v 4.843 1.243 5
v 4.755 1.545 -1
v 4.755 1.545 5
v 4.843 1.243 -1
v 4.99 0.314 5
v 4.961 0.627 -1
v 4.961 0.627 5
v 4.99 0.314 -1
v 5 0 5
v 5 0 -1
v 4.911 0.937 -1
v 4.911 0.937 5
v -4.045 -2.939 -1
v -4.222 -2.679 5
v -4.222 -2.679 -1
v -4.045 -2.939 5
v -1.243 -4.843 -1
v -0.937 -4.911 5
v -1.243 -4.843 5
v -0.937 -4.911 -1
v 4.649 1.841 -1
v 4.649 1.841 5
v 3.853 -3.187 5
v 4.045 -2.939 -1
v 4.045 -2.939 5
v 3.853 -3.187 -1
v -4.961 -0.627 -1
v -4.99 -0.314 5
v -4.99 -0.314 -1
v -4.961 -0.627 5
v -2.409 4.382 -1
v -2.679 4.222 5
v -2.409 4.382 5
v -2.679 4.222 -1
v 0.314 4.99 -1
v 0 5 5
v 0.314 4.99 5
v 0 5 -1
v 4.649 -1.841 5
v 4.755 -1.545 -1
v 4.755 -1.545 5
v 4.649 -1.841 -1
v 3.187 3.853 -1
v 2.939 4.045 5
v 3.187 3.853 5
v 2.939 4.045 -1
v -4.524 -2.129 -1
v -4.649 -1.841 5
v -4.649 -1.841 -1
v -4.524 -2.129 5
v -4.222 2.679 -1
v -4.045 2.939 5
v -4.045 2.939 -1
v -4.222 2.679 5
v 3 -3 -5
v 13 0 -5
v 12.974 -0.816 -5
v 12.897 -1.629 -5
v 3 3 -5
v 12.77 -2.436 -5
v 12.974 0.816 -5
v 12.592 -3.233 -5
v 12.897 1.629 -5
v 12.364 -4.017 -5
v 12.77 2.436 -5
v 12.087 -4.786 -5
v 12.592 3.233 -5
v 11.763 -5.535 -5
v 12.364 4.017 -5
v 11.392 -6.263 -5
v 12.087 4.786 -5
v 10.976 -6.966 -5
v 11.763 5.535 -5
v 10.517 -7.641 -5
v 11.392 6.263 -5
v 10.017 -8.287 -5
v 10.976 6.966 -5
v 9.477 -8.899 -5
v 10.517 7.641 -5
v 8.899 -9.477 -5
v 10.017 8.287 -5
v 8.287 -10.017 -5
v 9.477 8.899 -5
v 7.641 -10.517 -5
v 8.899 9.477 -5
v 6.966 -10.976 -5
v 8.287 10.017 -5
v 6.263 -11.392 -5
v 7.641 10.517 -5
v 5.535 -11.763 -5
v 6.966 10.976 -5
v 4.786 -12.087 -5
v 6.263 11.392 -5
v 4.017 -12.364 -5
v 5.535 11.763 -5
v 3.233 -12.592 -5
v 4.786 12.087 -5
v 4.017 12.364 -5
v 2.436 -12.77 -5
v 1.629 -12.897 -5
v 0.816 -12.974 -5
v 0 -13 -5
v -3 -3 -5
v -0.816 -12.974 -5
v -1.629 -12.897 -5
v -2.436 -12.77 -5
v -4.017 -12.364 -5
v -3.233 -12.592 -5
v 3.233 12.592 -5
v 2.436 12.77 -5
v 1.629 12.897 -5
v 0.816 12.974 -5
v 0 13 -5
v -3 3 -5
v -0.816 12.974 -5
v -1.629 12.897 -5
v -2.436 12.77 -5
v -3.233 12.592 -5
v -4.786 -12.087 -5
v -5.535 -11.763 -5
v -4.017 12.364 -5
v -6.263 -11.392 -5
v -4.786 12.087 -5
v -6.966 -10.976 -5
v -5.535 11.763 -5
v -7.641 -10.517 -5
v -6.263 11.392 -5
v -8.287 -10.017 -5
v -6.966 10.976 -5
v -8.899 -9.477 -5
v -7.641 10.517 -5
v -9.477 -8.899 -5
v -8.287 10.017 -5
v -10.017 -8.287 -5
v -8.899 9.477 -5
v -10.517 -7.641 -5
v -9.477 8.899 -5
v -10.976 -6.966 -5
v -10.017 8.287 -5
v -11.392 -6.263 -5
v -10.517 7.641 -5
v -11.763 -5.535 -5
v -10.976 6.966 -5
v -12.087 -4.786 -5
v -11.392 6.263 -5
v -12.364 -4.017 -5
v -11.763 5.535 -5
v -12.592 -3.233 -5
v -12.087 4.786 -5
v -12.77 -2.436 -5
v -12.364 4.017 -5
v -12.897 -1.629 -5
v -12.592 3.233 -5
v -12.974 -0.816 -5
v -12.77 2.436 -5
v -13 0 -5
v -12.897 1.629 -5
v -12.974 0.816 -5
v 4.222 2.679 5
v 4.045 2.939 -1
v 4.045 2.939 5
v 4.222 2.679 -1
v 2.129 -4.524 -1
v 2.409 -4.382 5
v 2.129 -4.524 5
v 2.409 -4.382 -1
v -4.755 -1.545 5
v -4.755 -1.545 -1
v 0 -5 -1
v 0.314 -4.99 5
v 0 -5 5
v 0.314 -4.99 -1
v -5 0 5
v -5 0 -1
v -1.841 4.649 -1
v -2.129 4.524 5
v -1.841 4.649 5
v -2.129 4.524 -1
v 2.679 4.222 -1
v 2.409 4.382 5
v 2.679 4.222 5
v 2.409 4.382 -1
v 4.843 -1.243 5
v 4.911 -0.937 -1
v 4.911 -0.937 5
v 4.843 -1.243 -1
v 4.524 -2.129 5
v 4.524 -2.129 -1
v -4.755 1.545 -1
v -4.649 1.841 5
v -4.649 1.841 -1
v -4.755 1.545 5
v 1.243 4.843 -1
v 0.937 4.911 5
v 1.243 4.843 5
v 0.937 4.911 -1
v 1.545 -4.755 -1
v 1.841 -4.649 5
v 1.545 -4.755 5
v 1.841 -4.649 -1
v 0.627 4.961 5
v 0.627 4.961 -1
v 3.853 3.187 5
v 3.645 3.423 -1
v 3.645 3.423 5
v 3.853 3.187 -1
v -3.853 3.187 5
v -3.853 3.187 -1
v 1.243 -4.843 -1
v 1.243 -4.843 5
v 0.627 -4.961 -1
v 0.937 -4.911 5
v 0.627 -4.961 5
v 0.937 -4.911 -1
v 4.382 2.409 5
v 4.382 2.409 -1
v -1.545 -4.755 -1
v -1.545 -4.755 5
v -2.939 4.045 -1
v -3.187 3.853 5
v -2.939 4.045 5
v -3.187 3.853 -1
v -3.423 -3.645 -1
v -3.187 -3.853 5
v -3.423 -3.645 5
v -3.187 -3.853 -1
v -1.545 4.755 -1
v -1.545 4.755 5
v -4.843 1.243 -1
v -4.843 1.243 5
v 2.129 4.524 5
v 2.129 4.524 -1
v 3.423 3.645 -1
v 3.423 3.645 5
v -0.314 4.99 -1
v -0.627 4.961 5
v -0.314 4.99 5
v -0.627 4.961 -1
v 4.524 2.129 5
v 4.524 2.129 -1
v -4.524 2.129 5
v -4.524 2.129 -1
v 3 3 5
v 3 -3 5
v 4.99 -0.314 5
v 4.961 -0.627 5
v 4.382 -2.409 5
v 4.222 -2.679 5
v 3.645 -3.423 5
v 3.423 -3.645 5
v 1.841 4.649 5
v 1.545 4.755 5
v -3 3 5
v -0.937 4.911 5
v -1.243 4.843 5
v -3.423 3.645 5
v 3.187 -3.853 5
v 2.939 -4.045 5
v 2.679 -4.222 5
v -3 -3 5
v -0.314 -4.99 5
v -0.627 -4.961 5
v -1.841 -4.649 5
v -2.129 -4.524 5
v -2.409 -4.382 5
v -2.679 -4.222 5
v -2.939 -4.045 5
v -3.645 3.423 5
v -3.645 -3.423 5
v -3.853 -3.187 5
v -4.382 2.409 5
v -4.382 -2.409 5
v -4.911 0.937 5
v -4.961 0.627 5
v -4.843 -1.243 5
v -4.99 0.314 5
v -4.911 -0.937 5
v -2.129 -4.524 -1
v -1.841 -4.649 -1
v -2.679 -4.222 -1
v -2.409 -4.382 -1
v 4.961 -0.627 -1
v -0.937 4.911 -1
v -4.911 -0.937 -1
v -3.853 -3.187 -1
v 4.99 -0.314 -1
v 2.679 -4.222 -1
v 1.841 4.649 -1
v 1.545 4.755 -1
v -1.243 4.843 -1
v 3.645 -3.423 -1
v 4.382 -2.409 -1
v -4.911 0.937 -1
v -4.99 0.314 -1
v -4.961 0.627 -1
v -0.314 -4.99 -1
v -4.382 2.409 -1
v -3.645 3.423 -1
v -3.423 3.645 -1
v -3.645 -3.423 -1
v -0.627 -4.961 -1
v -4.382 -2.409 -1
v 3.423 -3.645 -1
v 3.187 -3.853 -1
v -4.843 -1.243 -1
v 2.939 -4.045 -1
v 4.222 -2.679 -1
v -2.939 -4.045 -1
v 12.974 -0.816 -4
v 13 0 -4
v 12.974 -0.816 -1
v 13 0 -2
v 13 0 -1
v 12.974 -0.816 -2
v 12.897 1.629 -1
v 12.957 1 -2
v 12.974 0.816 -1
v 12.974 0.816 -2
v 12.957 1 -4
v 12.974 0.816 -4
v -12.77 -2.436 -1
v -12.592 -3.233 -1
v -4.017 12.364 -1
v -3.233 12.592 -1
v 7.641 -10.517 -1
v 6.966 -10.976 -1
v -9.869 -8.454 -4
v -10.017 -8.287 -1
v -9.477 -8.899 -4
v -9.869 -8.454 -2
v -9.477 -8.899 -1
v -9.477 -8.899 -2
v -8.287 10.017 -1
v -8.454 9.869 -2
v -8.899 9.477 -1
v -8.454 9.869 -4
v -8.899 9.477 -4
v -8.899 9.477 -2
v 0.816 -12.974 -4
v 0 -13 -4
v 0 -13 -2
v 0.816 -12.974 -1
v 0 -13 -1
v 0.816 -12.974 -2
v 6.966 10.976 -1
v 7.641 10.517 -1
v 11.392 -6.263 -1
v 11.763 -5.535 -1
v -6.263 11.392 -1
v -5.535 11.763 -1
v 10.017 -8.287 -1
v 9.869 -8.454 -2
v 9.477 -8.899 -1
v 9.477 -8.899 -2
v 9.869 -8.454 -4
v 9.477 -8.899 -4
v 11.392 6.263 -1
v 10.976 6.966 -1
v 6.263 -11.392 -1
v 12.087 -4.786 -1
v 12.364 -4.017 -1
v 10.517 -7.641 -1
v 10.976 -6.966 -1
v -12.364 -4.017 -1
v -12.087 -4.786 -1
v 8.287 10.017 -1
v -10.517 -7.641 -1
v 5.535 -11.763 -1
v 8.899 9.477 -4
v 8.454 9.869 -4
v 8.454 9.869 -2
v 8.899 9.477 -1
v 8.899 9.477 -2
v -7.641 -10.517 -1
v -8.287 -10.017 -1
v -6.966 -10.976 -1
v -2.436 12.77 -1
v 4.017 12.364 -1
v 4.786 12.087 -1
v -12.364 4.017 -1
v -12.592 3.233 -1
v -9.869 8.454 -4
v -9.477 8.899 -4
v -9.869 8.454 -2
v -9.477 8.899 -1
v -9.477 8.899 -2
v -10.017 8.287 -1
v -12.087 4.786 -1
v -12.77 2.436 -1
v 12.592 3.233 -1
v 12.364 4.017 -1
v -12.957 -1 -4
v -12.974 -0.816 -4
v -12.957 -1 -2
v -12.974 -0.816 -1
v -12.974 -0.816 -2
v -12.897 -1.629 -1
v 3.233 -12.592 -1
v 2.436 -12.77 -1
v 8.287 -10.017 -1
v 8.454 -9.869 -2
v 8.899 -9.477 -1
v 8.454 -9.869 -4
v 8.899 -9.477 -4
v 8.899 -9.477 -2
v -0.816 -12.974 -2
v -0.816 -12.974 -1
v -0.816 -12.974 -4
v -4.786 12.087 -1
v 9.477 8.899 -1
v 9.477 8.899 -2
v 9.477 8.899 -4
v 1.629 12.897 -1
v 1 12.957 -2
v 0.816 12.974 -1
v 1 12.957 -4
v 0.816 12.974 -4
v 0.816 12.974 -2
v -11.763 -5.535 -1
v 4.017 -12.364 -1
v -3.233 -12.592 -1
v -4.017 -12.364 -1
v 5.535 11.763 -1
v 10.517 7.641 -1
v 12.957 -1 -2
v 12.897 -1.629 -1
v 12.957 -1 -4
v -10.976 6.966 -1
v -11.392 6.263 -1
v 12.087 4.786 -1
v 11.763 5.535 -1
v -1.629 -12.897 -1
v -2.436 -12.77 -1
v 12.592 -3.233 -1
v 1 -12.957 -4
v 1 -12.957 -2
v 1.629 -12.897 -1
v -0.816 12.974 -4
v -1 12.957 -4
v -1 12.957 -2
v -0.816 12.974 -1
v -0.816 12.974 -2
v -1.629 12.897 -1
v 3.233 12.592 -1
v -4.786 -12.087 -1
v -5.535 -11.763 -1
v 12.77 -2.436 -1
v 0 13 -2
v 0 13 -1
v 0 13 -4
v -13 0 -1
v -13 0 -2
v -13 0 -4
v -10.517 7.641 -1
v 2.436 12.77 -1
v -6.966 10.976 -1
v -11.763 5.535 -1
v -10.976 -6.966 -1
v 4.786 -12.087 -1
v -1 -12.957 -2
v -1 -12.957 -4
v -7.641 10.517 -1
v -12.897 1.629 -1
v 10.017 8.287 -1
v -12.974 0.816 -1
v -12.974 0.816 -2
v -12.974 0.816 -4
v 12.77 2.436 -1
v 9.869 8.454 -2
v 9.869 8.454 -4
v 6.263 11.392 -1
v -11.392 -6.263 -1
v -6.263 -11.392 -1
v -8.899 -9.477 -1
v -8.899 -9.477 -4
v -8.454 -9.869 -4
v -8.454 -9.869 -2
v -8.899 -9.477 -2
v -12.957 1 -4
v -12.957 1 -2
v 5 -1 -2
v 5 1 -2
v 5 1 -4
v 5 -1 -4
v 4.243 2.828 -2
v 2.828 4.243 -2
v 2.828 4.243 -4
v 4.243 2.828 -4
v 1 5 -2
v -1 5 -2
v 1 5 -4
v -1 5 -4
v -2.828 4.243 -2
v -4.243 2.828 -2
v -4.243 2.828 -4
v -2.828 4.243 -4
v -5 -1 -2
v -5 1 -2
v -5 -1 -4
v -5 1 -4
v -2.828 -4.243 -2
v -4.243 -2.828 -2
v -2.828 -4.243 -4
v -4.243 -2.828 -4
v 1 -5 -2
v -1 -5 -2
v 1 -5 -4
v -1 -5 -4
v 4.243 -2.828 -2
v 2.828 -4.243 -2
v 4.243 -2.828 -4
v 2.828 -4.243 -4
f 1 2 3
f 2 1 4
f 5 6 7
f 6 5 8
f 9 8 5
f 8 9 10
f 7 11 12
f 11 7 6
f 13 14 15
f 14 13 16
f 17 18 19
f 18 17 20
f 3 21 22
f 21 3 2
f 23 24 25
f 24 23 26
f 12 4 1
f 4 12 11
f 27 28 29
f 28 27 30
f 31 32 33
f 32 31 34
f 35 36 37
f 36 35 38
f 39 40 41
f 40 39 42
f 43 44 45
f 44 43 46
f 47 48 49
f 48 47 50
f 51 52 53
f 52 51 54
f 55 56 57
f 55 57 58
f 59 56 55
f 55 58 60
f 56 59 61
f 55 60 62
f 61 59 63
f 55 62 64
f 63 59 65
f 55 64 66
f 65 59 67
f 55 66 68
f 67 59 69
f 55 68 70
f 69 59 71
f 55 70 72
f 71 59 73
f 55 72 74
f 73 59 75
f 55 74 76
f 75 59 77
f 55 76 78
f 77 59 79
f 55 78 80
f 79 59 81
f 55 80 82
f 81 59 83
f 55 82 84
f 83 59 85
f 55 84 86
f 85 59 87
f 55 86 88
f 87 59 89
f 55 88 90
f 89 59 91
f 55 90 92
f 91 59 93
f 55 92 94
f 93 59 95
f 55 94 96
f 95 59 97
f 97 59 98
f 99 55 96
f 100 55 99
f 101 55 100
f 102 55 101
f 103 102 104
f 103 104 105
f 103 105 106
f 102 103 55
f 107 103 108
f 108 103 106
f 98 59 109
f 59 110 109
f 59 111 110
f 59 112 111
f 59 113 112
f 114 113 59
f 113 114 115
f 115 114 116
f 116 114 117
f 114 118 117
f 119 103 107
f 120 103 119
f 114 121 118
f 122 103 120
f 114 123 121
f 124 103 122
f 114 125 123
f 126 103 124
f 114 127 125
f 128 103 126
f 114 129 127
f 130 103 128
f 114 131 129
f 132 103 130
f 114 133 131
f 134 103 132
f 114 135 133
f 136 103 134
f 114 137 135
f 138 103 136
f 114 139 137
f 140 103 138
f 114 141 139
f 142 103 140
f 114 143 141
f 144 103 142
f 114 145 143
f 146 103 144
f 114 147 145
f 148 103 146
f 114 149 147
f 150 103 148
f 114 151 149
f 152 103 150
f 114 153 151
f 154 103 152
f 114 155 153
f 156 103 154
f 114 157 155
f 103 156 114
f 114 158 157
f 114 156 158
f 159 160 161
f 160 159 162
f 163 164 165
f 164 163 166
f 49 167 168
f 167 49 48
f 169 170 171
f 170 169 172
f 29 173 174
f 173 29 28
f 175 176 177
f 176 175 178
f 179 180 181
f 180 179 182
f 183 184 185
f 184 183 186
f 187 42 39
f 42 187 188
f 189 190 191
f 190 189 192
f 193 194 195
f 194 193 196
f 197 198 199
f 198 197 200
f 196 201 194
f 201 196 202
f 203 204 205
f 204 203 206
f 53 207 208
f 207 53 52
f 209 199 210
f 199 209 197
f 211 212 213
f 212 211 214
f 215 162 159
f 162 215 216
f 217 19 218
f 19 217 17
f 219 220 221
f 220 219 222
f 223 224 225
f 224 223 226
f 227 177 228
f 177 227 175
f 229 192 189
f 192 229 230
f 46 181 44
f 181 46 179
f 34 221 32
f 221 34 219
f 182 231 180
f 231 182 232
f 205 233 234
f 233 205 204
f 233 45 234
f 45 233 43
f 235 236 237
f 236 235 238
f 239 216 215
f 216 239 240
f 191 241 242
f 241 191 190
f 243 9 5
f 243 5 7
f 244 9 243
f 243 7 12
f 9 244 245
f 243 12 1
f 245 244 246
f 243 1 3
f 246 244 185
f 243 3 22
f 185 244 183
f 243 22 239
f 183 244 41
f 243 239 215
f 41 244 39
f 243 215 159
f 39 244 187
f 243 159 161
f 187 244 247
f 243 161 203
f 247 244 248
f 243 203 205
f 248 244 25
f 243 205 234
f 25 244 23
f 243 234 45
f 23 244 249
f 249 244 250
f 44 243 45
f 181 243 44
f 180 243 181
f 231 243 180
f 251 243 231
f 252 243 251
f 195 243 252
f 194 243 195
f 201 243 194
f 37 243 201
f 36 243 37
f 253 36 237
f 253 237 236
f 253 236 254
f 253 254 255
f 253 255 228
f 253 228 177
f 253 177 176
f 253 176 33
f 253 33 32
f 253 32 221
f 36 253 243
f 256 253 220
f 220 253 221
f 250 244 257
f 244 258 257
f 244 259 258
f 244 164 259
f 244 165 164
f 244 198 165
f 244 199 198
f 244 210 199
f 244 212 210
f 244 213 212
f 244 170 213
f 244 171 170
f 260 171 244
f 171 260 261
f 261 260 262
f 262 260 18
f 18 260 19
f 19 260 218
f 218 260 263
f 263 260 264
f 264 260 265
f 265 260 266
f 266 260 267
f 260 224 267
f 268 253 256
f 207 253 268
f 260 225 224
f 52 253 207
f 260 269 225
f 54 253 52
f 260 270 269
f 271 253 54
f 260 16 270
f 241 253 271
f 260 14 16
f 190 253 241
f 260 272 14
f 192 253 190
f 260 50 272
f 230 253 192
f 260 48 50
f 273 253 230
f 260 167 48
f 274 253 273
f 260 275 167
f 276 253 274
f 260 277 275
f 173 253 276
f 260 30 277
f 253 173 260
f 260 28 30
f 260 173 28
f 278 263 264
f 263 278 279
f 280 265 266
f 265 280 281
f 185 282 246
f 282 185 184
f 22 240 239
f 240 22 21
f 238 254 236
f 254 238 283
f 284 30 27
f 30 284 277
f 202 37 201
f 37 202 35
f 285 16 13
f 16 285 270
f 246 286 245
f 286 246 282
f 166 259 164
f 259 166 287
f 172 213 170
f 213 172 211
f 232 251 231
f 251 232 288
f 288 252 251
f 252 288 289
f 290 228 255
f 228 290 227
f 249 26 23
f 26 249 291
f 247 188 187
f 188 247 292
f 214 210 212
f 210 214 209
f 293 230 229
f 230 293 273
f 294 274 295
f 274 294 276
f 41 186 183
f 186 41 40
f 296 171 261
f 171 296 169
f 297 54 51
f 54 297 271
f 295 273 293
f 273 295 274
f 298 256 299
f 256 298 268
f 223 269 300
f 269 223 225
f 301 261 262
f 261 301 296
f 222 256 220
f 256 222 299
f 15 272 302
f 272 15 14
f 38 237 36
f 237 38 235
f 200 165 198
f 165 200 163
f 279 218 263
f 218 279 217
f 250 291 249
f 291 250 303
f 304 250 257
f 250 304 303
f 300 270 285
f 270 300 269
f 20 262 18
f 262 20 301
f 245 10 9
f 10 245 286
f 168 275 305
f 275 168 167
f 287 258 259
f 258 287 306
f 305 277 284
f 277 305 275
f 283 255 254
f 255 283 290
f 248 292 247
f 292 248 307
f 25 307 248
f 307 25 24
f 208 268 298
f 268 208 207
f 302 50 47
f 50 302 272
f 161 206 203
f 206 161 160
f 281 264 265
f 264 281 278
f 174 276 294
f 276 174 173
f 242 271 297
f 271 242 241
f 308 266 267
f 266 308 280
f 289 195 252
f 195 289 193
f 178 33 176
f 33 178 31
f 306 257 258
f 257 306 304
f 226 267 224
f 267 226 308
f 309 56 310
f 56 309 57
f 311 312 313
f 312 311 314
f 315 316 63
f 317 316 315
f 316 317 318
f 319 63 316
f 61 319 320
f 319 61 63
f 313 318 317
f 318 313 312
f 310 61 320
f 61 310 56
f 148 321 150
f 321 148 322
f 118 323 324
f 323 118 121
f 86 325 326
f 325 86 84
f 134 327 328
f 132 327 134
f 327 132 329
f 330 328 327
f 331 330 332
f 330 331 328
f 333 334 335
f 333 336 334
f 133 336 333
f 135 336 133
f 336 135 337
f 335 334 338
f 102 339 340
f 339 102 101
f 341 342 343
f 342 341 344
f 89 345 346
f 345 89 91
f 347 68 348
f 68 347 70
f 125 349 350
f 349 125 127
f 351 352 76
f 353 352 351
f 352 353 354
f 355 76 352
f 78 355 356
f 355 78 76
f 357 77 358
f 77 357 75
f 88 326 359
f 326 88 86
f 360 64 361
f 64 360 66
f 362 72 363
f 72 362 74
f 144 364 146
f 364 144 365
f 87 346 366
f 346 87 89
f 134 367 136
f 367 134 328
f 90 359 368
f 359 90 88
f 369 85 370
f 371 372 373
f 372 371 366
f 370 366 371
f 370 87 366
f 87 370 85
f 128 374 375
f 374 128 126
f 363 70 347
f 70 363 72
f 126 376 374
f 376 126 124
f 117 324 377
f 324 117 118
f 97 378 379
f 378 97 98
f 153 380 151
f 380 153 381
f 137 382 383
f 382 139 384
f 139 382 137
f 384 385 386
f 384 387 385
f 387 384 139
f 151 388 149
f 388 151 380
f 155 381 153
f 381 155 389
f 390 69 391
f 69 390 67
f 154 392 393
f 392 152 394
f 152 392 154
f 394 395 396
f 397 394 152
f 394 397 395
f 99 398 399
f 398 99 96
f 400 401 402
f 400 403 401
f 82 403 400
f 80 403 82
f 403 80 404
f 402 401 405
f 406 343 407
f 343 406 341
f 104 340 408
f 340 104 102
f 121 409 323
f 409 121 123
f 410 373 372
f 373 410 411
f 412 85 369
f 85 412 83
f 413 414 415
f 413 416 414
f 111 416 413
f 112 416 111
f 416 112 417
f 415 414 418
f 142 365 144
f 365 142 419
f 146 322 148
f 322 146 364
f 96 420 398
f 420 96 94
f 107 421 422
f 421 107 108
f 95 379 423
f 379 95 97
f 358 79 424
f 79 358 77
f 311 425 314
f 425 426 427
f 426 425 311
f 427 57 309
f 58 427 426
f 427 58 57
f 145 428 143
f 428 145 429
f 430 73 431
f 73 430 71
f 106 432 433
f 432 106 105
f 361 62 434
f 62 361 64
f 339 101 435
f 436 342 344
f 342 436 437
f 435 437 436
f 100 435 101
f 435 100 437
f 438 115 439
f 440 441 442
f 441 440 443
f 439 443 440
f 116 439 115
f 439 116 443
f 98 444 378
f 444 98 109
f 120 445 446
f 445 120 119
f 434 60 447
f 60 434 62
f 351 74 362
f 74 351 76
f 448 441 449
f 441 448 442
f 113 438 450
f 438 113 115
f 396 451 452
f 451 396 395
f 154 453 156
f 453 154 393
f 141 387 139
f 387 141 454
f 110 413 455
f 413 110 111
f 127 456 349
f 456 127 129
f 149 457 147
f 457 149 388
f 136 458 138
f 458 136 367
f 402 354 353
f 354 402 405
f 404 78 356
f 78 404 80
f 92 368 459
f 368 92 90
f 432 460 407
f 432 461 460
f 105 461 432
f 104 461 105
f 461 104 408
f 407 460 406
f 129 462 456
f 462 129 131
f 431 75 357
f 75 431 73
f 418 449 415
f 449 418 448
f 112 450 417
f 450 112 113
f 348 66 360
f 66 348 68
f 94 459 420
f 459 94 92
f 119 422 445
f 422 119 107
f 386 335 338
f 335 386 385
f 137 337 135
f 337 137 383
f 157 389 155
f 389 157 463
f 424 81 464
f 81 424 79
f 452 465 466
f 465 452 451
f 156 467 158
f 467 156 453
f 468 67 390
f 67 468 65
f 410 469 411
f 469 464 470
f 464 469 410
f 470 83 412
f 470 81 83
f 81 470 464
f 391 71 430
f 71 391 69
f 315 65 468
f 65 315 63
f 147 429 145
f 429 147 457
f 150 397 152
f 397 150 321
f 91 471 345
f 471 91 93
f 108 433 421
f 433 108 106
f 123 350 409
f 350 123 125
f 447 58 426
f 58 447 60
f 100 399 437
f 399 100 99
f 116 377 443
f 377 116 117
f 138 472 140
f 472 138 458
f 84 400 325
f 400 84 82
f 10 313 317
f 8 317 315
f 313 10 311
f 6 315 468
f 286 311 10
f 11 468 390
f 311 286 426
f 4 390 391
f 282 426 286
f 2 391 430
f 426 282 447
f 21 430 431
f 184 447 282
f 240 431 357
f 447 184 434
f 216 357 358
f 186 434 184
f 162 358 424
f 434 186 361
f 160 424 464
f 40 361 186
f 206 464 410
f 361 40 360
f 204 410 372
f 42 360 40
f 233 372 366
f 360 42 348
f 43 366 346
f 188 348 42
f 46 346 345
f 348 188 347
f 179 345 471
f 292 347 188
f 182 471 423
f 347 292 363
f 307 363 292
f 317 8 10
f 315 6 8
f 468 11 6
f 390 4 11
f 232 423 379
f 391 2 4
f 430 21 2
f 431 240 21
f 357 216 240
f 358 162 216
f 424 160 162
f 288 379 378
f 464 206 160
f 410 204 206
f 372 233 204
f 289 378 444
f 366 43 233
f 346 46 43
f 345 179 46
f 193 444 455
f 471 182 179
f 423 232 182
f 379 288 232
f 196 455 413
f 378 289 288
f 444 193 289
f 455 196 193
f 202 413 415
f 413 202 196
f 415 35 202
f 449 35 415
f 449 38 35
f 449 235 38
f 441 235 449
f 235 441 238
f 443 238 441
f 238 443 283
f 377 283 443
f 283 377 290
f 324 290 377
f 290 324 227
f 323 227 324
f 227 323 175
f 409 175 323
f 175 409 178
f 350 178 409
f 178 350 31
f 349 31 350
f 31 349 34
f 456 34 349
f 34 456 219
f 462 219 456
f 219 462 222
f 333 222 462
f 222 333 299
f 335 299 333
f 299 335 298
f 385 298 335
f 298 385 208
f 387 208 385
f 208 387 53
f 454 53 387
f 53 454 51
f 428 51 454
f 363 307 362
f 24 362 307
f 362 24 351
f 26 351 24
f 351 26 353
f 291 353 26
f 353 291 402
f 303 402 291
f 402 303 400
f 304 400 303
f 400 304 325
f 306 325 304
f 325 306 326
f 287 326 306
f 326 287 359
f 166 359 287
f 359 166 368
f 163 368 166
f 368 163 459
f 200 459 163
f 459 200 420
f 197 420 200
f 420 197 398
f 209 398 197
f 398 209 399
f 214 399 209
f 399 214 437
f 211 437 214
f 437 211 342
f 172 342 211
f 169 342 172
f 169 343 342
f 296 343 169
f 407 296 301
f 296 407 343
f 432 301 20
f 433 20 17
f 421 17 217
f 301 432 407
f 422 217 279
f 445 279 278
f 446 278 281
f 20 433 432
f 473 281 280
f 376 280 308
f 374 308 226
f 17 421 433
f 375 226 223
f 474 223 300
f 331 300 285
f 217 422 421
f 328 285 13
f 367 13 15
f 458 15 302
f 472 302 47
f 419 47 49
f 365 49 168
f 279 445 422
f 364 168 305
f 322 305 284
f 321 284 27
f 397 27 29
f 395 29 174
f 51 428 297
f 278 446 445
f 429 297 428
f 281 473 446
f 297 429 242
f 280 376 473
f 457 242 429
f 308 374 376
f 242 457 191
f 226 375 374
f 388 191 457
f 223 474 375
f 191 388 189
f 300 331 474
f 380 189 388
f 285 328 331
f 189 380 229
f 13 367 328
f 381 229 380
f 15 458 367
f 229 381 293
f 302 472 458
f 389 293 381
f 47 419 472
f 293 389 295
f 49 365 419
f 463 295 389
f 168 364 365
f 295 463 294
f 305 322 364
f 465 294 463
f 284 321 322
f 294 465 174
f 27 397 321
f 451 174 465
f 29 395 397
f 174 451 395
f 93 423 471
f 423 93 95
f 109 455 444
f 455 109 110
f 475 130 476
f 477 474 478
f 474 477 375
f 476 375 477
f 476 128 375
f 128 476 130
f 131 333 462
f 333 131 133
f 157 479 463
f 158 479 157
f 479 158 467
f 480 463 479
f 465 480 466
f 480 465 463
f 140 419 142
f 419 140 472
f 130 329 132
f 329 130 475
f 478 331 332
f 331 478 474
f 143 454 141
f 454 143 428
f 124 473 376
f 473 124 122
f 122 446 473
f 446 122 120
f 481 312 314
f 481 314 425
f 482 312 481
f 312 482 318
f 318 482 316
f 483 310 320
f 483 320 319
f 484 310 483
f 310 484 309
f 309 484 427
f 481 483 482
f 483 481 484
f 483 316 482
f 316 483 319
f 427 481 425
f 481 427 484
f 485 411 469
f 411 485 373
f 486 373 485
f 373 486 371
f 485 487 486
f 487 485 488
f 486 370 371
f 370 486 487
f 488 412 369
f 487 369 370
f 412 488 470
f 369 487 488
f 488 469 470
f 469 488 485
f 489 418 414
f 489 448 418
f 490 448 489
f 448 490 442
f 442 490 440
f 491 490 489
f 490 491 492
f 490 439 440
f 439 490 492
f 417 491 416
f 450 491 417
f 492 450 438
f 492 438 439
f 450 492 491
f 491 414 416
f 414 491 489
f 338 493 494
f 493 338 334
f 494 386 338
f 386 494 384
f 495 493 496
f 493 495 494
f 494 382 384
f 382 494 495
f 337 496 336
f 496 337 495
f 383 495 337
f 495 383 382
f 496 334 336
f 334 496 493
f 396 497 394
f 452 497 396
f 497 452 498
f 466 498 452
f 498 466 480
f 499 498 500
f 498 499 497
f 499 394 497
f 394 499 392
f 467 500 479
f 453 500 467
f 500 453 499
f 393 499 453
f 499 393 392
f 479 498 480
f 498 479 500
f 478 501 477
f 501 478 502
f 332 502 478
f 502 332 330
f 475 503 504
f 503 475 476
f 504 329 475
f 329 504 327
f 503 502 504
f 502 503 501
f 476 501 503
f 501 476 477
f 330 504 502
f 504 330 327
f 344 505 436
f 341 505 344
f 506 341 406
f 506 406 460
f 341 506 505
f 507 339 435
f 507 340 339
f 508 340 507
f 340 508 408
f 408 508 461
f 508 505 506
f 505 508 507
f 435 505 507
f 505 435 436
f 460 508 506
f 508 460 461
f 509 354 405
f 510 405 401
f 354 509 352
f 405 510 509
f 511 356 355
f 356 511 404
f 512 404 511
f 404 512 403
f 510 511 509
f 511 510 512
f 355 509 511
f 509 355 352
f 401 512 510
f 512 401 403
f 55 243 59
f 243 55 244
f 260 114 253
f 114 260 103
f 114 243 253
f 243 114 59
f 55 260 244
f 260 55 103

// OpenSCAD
difference() {

    union() {
        cylinder(10,5,5, true, $fn=100);
        translate([0,0,-3]) {
            cylinder(4,13,13, true, $fn=100);
        }
    }


    cube([6,6,16], true);

    for ( i = [0 : 8] ){
        rotate( i * 45, [0, 0, 1]) {
                translate([15, 0, -3]) {
                cube([20,2,2], true);
            }
        }
    }

}


/*
cube([1.9,10,1.9], false);
cube([30,1.9,1.9], false);
*/
